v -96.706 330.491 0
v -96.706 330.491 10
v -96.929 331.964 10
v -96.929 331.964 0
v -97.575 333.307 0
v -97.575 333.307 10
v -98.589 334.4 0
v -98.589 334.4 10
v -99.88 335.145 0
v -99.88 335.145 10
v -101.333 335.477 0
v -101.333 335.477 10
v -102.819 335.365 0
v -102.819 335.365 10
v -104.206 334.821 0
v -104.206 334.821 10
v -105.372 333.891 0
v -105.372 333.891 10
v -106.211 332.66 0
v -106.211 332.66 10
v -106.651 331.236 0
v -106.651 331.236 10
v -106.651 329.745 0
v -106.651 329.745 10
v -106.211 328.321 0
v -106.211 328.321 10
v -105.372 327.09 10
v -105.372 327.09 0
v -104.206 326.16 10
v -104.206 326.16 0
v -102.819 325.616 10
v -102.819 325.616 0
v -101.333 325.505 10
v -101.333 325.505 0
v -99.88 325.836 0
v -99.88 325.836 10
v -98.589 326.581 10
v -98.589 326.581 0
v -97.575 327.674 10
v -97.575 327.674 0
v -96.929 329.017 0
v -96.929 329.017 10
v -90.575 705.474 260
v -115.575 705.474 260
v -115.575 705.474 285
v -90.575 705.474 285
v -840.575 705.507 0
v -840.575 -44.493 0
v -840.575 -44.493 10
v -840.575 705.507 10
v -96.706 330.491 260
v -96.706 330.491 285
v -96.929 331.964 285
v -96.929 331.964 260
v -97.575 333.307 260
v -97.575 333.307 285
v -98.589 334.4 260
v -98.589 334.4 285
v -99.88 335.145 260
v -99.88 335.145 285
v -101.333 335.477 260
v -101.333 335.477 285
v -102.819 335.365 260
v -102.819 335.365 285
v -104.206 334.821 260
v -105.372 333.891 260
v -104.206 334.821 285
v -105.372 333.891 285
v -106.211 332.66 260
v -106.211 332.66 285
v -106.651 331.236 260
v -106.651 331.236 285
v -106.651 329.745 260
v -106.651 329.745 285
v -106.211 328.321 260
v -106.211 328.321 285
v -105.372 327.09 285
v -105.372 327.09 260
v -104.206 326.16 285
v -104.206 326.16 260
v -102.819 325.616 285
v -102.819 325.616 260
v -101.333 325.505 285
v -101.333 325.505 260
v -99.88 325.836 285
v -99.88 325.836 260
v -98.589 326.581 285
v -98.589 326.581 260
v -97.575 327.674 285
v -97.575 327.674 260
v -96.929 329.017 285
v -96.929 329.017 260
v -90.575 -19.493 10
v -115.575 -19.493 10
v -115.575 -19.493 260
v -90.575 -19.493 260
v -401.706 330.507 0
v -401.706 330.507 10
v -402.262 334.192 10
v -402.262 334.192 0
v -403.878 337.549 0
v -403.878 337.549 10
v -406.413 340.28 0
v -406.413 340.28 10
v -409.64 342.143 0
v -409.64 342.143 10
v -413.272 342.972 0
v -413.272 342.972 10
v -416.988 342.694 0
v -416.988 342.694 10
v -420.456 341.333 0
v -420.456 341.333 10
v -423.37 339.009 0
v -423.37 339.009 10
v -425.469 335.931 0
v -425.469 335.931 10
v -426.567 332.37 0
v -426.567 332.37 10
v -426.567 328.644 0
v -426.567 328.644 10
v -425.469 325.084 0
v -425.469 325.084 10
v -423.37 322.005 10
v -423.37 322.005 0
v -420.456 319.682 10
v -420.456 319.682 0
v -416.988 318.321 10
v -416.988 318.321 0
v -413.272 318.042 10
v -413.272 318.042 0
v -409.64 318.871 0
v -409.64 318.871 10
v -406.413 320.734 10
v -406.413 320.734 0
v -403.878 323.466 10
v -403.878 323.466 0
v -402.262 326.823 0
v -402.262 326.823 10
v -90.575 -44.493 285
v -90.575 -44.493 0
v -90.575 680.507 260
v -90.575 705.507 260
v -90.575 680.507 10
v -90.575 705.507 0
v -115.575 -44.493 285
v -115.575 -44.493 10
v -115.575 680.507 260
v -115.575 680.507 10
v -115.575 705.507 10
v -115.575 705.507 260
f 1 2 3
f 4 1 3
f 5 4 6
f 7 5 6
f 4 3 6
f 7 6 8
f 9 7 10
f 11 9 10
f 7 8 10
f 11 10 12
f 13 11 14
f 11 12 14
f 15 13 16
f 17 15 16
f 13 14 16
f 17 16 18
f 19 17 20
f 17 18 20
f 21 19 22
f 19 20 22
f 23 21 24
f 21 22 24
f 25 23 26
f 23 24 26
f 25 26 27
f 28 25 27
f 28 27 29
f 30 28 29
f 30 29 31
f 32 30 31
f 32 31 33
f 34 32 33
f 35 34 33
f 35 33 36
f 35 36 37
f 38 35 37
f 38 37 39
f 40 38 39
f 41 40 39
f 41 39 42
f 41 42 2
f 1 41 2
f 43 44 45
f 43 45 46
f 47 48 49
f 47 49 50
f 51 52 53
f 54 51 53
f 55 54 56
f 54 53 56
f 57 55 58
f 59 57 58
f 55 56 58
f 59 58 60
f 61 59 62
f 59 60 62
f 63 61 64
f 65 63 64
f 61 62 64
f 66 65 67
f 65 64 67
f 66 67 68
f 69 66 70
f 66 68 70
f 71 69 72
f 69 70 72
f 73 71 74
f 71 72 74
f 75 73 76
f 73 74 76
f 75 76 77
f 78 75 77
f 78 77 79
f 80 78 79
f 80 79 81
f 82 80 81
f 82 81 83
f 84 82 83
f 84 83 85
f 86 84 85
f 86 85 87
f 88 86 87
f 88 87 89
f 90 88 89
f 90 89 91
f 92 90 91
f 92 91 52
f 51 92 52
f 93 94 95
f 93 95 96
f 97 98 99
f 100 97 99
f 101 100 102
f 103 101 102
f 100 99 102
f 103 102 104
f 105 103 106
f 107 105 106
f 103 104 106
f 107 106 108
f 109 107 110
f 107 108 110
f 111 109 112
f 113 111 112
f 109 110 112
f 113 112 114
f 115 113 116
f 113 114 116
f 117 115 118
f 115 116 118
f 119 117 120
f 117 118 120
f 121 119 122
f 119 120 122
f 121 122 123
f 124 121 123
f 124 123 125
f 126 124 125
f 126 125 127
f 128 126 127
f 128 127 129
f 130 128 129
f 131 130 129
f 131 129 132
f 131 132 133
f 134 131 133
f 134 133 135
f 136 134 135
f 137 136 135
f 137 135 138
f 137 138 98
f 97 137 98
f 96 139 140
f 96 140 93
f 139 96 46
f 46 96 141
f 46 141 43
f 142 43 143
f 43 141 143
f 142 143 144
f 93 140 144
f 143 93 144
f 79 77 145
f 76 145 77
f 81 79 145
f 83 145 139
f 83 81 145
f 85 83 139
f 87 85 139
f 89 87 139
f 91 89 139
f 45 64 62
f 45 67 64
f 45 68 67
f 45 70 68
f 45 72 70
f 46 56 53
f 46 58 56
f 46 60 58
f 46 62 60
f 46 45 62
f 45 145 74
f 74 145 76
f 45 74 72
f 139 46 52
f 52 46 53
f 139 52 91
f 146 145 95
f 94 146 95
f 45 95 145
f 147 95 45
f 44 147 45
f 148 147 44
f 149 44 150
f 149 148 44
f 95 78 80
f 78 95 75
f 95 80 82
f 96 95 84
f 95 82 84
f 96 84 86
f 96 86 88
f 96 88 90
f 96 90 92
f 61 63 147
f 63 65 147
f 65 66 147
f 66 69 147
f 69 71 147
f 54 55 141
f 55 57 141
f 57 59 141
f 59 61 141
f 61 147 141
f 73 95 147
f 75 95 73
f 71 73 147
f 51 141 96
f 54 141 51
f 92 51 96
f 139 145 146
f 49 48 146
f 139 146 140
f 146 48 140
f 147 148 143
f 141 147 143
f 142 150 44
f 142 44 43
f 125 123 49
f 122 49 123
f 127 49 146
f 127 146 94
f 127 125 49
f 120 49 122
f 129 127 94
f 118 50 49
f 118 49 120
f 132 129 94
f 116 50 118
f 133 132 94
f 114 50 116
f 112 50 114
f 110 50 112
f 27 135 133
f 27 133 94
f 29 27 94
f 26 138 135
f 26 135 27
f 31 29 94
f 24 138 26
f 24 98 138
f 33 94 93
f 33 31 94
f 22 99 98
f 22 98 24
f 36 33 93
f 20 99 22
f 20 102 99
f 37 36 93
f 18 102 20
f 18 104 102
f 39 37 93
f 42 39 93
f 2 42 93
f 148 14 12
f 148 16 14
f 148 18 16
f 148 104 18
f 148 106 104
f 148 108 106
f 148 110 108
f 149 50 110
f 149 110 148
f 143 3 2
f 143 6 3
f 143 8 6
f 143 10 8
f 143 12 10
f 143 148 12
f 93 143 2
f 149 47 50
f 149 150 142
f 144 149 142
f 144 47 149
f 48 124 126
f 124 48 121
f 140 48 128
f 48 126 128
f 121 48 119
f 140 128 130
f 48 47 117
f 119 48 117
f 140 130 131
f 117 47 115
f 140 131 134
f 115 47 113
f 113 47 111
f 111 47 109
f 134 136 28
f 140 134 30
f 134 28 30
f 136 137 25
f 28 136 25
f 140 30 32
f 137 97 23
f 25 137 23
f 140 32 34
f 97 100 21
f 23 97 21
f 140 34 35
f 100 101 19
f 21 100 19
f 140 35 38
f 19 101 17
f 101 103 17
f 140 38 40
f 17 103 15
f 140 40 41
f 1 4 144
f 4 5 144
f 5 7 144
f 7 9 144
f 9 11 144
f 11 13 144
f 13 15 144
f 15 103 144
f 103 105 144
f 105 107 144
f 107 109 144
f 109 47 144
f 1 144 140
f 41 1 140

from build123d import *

# Parameters (mm, degrees)
F0_W     = 750
F0_H     = 750
F1_DEPTH = 10
F2_W     = 25
F2_H     = 25
F3_DEPTH = 250
F4_W     = 25
F4_H     = 749.966674
F5_DEPTH = 25
F6_R     = 5
F7_DEPTH = 285.001
F8_R     = 12.5
F9_DEPTH = 25


with BuildPart() as f1:
    # F0 (on Top) → F1 (new body)
    with BuildSketch(Plane.XY):
        with Locations((-465.575071, 330.507226)):
            Rectangle(F0_W, F0_H)
    extrude(amount=F1_DEPTH)

    # F2 (on face) → F3 (join)
    with BuildSketch(Plane.XY.offset(10)):
        with Locations((-103.075071, -31.992774)):
            Rectangle(F2_W, F2_H)
        with Locations((-103.075071, 693.007226)):
            Rectangle(F2_W, F2_H)
    extrude(amount=F3_DEPTH)

    # F4 (on face) → F5 (join)
    with BuildSketch(Plane.XY.offset(260)):
        with Locations((-103.075071, 330.490563)):
            Rectangle(F4_W, F4_H)
    extrude(amount=F5_DEPTH)

    # F6 (on face) → F7 (cut, through all)
    with BuildSketch(Plane.XY.offset(285)):
        with Locations((-101.70645, 330.490563)):
            Circle(F6_R)
    extrude(amount=-F7_DEPTH, mode=Mode.SUBTRACT)

    # F8 (on face) → F9 (cut)
    with BuildSketch(Plane.XY.offset(10)):
        with Locations((-414.20645, 330.507226)):
            Circle(F8_R)
    extrude(amount=-F9_DEPTH, mode=Mode.SUBTRACT)


solid = f1.part
